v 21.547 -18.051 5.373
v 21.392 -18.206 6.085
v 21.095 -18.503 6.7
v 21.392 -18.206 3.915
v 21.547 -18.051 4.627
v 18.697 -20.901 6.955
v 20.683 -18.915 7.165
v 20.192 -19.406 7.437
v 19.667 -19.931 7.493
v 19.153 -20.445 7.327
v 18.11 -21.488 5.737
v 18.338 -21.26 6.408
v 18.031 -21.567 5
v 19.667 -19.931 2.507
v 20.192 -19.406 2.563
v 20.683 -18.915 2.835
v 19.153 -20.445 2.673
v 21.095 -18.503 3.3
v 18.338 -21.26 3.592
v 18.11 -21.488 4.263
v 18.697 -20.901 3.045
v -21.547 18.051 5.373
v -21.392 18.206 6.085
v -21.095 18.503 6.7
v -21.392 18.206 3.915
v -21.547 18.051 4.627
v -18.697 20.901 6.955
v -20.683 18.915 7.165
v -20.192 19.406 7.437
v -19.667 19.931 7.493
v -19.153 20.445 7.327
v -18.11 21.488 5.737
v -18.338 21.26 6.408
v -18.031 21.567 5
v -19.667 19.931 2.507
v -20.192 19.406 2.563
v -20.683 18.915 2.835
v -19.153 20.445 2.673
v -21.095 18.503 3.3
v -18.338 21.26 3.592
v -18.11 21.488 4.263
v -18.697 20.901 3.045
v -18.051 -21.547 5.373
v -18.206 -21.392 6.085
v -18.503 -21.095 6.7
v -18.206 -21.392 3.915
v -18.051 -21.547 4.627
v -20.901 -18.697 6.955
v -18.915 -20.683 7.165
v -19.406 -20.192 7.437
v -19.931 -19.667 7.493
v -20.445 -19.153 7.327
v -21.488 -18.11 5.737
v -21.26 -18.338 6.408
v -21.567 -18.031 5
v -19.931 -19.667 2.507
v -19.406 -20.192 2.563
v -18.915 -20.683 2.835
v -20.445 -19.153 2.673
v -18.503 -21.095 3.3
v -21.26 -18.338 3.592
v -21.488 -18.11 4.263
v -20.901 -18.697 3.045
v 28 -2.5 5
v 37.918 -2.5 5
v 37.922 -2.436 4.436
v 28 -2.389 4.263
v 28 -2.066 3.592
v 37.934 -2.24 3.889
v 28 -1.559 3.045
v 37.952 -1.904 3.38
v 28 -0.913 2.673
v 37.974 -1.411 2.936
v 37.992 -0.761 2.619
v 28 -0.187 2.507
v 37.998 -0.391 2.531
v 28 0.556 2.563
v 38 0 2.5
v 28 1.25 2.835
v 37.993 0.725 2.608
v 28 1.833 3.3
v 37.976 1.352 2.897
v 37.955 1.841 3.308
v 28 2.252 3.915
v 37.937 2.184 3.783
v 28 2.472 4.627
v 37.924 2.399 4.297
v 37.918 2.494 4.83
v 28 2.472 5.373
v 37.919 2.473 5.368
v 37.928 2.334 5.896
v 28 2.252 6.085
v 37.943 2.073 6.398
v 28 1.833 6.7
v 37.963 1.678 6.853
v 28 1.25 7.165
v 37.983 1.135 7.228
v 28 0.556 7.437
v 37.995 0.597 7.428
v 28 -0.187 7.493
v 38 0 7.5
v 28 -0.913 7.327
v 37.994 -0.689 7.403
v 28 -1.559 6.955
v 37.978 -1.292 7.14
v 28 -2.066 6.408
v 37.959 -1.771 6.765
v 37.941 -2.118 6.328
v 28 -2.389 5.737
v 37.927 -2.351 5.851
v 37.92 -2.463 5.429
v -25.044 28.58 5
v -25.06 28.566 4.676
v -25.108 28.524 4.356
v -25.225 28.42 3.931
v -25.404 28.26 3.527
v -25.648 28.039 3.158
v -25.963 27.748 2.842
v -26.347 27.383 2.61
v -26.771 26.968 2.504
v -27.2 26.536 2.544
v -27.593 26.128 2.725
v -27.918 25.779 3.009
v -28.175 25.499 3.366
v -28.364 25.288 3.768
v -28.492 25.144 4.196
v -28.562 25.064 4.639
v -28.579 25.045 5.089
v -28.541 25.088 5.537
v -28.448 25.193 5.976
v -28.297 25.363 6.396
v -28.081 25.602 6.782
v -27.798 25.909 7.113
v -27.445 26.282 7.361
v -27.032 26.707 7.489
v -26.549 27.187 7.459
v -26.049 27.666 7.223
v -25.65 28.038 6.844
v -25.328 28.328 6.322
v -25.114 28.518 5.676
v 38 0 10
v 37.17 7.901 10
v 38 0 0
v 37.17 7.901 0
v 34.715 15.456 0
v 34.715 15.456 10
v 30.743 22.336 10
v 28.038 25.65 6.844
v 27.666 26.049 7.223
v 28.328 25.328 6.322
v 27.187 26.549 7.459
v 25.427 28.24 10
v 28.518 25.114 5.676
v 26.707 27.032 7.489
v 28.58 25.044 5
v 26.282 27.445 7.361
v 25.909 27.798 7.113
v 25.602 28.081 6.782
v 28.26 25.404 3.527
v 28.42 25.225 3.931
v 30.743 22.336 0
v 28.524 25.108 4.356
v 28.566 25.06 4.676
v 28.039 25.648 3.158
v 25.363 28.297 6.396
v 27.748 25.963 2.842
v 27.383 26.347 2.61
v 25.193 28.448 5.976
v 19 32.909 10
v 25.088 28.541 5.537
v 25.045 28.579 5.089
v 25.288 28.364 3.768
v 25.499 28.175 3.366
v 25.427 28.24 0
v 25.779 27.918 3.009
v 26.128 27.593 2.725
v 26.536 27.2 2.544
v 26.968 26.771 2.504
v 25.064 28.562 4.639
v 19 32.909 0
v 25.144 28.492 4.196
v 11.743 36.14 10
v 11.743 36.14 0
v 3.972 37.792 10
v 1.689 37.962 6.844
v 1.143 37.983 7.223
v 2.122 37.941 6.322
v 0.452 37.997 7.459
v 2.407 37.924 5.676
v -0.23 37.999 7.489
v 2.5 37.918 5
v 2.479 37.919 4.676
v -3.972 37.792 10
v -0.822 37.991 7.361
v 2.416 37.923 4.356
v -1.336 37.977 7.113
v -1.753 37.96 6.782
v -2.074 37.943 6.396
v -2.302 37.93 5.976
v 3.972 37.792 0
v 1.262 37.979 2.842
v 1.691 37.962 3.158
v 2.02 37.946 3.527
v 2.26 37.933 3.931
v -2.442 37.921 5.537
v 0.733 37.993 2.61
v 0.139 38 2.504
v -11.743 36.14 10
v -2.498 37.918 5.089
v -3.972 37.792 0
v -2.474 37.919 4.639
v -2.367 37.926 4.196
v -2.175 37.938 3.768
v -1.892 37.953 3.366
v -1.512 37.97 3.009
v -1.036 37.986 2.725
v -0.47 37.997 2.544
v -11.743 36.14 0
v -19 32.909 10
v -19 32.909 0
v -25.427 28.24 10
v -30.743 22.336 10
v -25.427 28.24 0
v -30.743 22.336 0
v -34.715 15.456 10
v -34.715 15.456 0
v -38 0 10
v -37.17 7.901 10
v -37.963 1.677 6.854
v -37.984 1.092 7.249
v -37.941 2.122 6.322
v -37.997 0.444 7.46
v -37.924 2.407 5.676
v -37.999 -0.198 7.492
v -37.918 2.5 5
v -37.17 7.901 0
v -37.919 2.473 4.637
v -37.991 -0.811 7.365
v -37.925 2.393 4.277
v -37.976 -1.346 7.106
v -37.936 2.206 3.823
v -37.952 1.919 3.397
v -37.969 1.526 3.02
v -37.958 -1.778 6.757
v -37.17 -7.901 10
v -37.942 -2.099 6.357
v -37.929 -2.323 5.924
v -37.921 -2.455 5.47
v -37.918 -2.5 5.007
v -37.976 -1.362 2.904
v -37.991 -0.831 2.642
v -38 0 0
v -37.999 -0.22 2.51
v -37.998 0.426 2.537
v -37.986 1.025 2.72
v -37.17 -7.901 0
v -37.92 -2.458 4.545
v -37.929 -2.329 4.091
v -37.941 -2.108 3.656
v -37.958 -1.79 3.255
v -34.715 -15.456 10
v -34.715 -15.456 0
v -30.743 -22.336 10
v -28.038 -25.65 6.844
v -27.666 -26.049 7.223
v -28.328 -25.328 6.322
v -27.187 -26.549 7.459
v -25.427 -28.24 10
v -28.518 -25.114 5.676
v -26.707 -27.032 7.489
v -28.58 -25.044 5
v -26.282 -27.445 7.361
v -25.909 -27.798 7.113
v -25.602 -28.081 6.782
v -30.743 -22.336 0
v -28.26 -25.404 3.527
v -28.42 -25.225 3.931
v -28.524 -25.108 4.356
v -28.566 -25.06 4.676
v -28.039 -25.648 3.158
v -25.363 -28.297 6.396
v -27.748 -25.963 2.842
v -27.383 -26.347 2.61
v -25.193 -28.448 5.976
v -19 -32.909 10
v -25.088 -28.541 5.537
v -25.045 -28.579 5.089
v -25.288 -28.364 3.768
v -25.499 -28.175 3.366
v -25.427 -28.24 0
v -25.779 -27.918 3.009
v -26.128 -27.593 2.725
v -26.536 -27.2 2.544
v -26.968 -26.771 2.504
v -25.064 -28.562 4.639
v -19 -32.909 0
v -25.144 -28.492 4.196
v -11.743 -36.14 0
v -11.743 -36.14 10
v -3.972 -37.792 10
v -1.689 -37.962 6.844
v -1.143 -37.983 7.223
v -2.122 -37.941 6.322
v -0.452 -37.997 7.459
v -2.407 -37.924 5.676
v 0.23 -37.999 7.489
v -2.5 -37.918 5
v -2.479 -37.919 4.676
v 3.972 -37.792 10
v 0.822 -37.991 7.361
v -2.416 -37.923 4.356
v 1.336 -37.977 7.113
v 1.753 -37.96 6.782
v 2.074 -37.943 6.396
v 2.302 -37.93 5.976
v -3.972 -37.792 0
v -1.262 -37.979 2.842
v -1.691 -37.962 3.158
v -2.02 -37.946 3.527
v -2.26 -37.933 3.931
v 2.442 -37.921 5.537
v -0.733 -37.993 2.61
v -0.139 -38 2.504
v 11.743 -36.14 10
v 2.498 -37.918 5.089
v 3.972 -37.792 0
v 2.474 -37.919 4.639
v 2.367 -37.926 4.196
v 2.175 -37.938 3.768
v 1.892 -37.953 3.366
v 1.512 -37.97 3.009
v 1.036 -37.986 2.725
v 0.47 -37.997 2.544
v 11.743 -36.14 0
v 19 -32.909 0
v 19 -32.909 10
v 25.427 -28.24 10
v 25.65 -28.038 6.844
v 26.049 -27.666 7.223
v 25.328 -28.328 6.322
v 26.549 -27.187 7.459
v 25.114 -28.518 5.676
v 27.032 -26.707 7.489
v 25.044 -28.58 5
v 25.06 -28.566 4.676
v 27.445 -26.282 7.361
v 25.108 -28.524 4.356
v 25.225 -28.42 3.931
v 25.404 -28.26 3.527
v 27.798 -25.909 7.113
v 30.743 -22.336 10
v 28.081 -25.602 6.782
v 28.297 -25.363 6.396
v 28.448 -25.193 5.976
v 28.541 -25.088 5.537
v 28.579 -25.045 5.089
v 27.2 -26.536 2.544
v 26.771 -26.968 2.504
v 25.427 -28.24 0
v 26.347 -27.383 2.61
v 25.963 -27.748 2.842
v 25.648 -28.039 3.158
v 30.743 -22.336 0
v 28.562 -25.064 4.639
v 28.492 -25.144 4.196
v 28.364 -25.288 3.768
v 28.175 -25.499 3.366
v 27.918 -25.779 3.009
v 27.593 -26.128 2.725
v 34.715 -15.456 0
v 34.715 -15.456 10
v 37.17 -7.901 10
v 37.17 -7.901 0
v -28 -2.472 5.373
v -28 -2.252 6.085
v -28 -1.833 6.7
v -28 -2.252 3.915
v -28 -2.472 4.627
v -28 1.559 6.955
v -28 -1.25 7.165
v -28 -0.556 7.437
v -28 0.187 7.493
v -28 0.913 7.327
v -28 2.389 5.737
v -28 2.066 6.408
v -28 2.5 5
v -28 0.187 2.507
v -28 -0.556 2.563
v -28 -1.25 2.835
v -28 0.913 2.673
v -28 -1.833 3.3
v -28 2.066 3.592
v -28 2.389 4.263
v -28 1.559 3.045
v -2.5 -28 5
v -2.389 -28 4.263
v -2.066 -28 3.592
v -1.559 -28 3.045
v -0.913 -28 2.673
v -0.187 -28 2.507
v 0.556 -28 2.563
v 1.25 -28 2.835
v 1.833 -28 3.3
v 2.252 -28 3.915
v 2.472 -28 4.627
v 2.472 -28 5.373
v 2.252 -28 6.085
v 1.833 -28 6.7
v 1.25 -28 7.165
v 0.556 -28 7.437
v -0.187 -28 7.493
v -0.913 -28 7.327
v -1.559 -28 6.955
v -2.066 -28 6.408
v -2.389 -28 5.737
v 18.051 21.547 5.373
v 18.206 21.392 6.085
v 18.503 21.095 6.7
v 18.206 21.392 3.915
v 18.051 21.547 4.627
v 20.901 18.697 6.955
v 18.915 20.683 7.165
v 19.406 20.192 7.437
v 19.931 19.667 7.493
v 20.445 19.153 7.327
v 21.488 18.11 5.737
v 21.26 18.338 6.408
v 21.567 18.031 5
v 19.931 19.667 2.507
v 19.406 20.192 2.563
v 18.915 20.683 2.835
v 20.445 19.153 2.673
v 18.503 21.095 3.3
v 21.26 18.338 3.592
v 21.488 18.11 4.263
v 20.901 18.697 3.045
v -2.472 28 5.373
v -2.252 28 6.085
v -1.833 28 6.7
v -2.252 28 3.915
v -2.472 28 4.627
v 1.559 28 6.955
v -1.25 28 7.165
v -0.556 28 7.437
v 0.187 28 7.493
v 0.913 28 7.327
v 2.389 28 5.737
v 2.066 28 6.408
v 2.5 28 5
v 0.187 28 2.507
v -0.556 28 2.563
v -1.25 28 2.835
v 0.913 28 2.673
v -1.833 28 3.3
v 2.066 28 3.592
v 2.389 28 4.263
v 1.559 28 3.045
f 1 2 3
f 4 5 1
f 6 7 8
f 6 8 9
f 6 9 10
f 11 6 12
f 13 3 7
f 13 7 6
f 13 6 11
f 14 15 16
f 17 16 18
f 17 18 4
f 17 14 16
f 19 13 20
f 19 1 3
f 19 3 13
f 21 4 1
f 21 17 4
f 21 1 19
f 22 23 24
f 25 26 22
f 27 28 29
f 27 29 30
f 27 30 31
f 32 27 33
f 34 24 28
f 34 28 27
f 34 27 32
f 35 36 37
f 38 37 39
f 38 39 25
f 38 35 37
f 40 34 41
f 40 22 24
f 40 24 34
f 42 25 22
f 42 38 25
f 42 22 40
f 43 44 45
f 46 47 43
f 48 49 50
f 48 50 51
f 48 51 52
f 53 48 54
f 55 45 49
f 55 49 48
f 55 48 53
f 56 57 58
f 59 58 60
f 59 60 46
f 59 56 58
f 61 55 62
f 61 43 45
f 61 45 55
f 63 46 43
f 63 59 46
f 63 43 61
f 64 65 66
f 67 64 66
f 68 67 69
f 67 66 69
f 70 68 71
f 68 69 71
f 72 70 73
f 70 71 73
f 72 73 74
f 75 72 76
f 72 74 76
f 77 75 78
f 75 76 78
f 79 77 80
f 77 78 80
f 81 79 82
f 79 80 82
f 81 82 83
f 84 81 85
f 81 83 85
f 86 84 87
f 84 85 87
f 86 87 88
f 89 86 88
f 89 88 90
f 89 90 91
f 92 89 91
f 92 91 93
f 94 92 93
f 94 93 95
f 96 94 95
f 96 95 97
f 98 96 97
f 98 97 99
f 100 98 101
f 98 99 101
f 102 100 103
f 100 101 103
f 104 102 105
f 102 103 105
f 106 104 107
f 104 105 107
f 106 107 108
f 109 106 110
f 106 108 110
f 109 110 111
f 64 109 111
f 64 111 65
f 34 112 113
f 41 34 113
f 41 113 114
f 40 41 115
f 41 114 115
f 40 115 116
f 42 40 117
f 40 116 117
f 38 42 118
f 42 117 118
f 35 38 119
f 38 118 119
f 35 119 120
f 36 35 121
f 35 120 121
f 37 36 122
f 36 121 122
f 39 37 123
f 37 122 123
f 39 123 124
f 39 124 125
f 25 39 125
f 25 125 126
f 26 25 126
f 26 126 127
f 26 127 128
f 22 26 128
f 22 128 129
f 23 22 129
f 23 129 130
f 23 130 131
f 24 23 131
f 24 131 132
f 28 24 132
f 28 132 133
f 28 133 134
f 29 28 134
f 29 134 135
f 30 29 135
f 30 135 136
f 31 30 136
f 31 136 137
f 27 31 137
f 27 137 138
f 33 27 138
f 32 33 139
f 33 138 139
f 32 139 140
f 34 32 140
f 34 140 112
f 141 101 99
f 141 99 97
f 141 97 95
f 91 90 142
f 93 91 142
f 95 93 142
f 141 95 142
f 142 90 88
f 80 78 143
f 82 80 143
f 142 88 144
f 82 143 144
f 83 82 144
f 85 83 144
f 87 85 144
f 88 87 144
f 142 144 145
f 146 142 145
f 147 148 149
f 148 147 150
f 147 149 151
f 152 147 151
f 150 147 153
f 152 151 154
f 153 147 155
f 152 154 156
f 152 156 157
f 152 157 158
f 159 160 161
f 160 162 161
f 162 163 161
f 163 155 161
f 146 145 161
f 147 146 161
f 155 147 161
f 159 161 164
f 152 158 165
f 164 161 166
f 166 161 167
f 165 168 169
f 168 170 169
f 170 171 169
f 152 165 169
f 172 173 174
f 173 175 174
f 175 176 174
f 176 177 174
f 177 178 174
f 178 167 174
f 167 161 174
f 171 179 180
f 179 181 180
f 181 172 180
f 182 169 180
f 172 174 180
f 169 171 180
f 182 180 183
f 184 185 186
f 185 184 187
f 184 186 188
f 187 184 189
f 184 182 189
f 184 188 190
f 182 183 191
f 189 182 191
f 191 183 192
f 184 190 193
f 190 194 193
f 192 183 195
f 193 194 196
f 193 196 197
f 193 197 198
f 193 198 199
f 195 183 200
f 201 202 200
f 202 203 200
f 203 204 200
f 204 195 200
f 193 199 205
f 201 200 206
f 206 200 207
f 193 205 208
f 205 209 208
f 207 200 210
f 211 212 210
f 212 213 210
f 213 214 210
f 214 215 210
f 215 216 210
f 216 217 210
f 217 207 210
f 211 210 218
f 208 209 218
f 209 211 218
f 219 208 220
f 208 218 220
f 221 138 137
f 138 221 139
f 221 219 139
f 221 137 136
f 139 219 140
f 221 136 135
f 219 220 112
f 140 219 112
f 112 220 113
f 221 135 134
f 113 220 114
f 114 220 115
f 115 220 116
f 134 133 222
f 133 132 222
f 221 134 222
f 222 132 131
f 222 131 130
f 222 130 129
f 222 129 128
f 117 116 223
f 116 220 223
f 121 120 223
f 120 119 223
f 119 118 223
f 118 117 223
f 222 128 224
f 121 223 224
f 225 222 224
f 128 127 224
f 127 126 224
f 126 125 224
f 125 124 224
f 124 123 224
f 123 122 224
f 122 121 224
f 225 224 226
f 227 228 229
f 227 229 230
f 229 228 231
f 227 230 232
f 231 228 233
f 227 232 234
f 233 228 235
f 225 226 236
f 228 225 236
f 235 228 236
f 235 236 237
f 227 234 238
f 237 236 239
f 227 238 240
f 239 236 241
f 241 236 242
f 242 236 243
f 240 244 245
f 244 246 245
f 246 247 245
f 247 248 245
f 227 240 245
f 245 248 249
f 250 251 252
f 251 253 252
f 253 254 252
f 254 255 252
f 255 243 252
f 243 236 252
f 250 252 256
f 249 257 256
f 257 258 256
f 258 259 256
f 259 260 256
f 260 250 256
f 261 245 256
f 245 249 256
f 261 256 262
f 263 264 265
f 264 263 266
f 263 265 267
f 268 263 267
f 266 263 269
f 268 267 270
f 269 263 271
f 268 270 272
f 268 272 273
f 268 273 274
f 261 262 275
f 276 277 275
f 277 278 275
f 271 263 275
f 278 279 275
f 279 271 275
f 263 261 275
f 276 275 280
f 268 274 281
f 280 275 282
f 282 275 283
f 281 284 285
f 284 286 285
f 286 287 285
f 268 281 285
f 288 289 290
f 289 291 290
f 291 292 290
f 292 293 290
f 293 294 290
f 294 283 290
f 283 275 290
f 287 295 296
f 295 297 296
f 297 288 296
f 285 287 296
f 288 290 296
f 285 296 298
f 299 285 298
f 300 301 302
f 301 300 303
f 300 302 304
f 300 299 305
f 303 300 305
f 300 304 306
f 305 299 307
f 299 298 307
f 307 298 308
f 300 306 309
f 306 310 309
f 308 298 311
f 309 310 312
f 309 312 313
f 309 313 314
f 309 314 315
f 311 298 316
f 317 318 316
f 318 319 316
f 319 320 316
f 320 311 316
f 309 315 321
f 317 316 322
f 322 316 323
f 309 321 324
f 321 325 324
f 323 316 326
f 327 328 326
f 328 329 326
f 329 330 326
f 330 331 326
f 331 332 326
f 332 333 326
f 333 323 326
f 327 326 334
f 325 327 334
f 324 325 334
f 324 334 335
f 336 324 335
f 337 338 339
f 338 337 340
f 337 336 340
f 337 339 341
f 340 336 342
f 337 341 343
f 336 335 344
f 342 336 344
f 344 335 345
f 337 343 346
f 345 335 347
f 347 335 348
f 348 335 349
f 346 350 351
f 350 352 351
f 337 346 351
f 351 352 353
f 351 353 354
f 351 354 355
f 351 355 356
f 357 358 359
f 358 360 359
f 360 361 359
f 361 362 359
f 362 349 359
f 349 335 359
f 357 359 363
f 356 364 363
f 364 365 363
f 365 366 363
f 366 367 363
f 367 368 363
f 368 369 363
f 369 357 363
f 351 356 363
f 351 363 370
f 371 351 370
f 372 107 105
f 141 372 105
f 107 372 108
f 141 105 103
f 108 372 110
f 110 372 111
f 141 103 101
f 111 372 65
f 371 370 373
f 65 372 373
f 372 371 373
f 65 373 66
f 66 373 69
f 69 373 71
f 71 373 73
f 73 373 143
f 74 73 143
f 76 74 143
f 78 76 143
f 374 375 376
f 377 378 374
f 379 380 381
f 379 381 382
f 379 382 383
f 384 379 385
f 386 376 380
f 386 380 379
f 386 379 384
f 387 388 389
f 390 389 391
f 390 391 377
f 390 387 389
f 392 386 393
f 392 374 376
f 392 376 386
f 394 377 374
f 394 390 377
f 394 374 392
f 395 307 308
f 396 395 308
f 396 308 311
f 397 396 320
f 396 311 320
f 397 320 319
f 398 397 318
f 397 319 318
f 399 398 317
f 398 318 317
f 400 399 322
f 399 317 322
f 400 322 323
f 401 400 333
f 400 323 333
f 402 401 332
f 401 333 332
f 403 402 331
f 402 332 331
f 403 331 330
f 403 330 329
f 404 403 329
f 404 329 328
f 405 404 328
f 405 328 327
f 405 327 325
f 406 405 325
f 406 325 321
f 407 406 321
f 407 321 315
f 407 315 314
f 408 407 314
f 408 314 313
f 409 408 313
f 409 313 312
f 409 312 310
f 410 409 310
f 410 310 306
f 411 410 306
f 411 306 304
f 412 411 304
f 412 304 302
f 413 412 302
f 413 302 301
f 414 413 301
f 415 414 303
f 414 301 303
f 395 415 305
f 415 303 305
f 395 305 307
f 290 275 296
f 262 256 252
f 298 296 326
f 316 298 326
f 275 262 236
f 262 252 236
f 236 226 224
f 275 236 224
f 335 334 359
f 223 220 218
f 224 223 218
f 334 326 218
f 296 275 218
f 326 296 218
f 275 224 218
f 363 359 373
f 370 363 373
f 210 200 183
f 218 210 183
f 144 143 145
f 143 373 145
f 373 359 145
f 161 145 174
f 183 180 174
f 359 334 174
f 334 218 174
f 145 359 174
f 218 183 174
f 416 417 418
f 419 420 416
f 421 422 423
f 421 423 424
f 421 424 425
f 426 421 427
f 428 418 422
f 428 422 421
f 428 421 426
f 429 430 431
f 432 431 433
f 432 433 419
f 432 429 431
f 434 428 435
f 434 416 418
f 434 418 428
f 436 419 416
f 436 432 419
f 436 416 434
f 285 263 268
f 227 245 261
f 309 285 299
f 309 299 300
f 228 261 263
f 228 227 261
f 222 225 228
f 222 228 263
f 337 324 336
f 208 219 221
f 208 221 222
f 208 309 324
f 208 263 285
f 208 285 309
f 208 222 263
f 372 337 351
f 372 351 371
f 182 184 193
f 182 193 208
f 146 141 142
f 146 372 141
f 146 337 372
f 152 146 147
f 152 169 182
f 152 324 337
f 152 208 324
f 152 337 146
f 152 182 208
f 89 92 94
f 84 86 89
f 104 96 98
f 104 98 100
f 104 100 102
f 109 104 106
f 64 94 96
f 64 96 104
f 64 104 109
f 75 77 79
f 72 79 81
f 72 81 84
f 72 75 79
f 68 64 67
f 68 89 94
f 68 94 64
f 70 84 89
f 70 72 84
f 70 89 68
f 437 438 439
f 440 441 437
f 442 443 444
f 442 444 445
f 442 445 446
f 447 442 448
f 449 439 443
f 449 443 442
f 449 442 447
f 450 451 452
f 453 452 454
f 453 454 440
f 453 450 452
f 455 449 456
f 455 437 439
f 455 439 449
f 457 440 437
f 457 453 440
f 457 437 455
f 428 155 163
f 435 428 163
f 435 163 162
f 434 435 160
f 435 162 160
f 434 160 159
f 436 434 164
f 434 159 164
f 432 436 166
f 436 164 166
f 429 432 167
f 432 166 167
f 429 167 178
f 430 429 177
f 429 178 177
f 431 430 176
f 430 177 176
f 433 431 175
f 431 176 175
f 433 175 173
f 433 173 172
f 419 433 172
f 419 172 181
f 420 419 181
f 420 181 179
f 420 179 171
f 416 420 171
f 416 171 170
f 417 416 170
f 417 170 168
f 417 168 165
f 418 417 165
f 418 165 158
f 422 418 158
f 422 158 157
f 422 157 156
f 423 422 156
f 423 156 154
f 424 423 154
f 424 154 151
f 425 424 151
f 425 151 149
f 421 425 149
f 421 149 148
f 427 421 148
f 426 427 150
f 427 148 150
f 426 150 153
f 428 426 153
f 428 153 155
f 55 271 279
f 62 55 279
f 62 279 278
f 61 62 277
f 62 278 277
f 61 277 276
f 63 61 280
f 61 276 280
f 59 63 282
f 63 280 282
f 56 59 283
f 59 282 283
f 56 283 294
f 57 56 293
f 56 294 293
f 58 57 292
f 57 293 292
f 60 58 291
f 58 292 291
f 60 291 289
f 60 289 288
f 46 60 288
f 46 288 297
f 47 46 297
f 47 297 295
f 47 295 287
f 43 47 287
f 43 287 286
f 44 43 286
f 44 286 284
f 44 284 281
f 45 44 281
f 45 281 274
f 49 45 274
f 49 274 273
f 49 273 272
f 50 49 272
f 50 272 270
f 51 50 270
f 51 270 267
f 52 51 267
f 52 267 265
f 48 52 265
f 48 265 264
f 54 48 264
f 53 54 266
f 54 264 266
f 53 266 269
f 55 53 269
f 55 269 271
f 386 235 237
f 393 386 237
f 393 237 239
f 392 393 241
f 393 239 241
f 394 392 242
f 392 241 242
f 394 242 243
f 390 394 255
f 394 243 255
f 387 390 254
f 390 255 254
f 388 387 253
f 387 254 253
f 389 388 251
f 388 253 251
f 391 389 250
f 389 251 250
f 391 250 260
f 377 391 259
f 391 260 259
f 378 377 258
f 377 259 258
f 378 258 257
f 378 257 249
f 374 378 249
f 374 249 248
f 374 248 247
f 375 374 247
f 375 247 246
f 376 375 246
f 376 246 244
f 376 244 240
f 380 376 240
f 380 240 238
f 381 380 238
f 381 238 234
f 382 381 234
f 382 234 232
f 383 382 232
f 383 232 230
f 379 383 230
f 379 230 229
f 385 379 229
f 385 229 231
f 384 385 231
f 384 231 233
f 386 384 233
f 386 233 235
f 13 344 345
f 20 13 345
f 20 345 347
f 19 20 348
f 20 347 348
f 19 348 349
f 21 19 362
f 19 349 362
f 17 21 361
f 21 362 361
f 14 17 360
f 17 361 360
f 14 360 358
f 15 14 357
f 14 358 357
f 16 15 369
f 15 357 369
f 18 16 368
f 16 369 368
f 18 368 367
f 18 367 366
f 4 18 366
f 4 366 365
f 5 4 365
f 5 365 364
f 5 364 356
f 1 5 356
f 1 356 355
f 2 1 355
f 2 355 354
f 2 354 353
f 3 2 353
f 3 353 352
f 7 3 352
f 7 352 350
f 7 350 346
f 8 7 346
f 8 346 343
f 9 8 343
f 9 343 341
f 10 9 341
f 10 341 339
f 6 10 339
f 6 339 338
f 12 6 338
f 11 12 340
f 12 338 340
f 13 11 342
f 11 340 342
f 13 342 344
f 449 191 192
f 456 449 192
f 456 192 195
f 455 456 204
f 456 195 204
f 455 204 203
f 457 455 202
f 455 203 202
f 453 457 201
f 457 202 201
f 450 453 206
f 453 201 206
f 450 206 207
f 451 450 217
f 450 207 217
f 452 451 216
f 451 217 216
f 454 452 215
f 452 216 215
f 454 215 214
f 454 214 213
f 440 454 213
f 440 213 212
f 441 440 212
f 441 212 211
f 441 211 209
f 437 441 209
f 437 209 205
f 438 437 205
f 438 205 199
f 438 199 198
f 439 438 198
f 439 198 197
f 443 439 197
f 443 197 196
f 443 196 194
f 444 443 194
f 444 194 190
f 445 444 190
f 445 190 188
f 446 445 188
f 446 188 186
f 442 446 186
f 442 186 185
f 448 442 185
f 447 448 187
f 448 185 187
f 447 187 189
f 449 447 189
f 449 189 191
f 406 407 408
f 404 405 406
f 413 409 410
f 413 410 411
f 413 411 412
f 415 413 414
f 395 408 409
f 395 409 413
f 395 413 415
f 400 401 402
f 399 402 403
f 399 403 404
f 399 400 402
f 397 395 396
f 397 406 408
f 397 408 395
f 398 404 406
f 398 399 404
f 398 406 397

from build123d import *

# Parameters (mm, degrees)
SKETCH1_R           = 38
BOSS_EXTRUDE1_DEPTH = 10
SKETCH2_R           = 2.5
CUT_EXTRUDE1_DEPTH  = 10
CIRPATTERN1_COUNT   = 8


with BuildPart() as part:
    # Sketch1 → Boss-Extrude1 (new body)
    with BuildSketch(Plane.XY):
        Circle(SKETCH1_R)
    extrude(amount=BOSS_EXTRUDE1_DEPTH)

    # Sketch2 → Cut-Extrude1 (cut)
    with BuildSketch(Plane(origin=(0, 38, 0), x_dir=(1, 0, 0), z_dir=(0, 1, 0))):
        with Locations((0, -5)):
            Circle(SKETCH2_R)
    cut_extrude1 = extrude(amount=-CUT_EXTRUDE1_DEPTH, mode=Mode.SUBTRACT)

    # CirPattern1: Cut-Extrude1 ×8 about axis
    cirpattern1_axis = Axis((0, 0, 0), (0, 0, 1))
    for i in range(1, CIRPATTERN1_COUNT):
        add(cut_extrude1.rotate(cirpattern1_axis, i * 360 / CIRPATTERN1_COUNT), mode=Mode.SUBTRACT)


solid = part.part
